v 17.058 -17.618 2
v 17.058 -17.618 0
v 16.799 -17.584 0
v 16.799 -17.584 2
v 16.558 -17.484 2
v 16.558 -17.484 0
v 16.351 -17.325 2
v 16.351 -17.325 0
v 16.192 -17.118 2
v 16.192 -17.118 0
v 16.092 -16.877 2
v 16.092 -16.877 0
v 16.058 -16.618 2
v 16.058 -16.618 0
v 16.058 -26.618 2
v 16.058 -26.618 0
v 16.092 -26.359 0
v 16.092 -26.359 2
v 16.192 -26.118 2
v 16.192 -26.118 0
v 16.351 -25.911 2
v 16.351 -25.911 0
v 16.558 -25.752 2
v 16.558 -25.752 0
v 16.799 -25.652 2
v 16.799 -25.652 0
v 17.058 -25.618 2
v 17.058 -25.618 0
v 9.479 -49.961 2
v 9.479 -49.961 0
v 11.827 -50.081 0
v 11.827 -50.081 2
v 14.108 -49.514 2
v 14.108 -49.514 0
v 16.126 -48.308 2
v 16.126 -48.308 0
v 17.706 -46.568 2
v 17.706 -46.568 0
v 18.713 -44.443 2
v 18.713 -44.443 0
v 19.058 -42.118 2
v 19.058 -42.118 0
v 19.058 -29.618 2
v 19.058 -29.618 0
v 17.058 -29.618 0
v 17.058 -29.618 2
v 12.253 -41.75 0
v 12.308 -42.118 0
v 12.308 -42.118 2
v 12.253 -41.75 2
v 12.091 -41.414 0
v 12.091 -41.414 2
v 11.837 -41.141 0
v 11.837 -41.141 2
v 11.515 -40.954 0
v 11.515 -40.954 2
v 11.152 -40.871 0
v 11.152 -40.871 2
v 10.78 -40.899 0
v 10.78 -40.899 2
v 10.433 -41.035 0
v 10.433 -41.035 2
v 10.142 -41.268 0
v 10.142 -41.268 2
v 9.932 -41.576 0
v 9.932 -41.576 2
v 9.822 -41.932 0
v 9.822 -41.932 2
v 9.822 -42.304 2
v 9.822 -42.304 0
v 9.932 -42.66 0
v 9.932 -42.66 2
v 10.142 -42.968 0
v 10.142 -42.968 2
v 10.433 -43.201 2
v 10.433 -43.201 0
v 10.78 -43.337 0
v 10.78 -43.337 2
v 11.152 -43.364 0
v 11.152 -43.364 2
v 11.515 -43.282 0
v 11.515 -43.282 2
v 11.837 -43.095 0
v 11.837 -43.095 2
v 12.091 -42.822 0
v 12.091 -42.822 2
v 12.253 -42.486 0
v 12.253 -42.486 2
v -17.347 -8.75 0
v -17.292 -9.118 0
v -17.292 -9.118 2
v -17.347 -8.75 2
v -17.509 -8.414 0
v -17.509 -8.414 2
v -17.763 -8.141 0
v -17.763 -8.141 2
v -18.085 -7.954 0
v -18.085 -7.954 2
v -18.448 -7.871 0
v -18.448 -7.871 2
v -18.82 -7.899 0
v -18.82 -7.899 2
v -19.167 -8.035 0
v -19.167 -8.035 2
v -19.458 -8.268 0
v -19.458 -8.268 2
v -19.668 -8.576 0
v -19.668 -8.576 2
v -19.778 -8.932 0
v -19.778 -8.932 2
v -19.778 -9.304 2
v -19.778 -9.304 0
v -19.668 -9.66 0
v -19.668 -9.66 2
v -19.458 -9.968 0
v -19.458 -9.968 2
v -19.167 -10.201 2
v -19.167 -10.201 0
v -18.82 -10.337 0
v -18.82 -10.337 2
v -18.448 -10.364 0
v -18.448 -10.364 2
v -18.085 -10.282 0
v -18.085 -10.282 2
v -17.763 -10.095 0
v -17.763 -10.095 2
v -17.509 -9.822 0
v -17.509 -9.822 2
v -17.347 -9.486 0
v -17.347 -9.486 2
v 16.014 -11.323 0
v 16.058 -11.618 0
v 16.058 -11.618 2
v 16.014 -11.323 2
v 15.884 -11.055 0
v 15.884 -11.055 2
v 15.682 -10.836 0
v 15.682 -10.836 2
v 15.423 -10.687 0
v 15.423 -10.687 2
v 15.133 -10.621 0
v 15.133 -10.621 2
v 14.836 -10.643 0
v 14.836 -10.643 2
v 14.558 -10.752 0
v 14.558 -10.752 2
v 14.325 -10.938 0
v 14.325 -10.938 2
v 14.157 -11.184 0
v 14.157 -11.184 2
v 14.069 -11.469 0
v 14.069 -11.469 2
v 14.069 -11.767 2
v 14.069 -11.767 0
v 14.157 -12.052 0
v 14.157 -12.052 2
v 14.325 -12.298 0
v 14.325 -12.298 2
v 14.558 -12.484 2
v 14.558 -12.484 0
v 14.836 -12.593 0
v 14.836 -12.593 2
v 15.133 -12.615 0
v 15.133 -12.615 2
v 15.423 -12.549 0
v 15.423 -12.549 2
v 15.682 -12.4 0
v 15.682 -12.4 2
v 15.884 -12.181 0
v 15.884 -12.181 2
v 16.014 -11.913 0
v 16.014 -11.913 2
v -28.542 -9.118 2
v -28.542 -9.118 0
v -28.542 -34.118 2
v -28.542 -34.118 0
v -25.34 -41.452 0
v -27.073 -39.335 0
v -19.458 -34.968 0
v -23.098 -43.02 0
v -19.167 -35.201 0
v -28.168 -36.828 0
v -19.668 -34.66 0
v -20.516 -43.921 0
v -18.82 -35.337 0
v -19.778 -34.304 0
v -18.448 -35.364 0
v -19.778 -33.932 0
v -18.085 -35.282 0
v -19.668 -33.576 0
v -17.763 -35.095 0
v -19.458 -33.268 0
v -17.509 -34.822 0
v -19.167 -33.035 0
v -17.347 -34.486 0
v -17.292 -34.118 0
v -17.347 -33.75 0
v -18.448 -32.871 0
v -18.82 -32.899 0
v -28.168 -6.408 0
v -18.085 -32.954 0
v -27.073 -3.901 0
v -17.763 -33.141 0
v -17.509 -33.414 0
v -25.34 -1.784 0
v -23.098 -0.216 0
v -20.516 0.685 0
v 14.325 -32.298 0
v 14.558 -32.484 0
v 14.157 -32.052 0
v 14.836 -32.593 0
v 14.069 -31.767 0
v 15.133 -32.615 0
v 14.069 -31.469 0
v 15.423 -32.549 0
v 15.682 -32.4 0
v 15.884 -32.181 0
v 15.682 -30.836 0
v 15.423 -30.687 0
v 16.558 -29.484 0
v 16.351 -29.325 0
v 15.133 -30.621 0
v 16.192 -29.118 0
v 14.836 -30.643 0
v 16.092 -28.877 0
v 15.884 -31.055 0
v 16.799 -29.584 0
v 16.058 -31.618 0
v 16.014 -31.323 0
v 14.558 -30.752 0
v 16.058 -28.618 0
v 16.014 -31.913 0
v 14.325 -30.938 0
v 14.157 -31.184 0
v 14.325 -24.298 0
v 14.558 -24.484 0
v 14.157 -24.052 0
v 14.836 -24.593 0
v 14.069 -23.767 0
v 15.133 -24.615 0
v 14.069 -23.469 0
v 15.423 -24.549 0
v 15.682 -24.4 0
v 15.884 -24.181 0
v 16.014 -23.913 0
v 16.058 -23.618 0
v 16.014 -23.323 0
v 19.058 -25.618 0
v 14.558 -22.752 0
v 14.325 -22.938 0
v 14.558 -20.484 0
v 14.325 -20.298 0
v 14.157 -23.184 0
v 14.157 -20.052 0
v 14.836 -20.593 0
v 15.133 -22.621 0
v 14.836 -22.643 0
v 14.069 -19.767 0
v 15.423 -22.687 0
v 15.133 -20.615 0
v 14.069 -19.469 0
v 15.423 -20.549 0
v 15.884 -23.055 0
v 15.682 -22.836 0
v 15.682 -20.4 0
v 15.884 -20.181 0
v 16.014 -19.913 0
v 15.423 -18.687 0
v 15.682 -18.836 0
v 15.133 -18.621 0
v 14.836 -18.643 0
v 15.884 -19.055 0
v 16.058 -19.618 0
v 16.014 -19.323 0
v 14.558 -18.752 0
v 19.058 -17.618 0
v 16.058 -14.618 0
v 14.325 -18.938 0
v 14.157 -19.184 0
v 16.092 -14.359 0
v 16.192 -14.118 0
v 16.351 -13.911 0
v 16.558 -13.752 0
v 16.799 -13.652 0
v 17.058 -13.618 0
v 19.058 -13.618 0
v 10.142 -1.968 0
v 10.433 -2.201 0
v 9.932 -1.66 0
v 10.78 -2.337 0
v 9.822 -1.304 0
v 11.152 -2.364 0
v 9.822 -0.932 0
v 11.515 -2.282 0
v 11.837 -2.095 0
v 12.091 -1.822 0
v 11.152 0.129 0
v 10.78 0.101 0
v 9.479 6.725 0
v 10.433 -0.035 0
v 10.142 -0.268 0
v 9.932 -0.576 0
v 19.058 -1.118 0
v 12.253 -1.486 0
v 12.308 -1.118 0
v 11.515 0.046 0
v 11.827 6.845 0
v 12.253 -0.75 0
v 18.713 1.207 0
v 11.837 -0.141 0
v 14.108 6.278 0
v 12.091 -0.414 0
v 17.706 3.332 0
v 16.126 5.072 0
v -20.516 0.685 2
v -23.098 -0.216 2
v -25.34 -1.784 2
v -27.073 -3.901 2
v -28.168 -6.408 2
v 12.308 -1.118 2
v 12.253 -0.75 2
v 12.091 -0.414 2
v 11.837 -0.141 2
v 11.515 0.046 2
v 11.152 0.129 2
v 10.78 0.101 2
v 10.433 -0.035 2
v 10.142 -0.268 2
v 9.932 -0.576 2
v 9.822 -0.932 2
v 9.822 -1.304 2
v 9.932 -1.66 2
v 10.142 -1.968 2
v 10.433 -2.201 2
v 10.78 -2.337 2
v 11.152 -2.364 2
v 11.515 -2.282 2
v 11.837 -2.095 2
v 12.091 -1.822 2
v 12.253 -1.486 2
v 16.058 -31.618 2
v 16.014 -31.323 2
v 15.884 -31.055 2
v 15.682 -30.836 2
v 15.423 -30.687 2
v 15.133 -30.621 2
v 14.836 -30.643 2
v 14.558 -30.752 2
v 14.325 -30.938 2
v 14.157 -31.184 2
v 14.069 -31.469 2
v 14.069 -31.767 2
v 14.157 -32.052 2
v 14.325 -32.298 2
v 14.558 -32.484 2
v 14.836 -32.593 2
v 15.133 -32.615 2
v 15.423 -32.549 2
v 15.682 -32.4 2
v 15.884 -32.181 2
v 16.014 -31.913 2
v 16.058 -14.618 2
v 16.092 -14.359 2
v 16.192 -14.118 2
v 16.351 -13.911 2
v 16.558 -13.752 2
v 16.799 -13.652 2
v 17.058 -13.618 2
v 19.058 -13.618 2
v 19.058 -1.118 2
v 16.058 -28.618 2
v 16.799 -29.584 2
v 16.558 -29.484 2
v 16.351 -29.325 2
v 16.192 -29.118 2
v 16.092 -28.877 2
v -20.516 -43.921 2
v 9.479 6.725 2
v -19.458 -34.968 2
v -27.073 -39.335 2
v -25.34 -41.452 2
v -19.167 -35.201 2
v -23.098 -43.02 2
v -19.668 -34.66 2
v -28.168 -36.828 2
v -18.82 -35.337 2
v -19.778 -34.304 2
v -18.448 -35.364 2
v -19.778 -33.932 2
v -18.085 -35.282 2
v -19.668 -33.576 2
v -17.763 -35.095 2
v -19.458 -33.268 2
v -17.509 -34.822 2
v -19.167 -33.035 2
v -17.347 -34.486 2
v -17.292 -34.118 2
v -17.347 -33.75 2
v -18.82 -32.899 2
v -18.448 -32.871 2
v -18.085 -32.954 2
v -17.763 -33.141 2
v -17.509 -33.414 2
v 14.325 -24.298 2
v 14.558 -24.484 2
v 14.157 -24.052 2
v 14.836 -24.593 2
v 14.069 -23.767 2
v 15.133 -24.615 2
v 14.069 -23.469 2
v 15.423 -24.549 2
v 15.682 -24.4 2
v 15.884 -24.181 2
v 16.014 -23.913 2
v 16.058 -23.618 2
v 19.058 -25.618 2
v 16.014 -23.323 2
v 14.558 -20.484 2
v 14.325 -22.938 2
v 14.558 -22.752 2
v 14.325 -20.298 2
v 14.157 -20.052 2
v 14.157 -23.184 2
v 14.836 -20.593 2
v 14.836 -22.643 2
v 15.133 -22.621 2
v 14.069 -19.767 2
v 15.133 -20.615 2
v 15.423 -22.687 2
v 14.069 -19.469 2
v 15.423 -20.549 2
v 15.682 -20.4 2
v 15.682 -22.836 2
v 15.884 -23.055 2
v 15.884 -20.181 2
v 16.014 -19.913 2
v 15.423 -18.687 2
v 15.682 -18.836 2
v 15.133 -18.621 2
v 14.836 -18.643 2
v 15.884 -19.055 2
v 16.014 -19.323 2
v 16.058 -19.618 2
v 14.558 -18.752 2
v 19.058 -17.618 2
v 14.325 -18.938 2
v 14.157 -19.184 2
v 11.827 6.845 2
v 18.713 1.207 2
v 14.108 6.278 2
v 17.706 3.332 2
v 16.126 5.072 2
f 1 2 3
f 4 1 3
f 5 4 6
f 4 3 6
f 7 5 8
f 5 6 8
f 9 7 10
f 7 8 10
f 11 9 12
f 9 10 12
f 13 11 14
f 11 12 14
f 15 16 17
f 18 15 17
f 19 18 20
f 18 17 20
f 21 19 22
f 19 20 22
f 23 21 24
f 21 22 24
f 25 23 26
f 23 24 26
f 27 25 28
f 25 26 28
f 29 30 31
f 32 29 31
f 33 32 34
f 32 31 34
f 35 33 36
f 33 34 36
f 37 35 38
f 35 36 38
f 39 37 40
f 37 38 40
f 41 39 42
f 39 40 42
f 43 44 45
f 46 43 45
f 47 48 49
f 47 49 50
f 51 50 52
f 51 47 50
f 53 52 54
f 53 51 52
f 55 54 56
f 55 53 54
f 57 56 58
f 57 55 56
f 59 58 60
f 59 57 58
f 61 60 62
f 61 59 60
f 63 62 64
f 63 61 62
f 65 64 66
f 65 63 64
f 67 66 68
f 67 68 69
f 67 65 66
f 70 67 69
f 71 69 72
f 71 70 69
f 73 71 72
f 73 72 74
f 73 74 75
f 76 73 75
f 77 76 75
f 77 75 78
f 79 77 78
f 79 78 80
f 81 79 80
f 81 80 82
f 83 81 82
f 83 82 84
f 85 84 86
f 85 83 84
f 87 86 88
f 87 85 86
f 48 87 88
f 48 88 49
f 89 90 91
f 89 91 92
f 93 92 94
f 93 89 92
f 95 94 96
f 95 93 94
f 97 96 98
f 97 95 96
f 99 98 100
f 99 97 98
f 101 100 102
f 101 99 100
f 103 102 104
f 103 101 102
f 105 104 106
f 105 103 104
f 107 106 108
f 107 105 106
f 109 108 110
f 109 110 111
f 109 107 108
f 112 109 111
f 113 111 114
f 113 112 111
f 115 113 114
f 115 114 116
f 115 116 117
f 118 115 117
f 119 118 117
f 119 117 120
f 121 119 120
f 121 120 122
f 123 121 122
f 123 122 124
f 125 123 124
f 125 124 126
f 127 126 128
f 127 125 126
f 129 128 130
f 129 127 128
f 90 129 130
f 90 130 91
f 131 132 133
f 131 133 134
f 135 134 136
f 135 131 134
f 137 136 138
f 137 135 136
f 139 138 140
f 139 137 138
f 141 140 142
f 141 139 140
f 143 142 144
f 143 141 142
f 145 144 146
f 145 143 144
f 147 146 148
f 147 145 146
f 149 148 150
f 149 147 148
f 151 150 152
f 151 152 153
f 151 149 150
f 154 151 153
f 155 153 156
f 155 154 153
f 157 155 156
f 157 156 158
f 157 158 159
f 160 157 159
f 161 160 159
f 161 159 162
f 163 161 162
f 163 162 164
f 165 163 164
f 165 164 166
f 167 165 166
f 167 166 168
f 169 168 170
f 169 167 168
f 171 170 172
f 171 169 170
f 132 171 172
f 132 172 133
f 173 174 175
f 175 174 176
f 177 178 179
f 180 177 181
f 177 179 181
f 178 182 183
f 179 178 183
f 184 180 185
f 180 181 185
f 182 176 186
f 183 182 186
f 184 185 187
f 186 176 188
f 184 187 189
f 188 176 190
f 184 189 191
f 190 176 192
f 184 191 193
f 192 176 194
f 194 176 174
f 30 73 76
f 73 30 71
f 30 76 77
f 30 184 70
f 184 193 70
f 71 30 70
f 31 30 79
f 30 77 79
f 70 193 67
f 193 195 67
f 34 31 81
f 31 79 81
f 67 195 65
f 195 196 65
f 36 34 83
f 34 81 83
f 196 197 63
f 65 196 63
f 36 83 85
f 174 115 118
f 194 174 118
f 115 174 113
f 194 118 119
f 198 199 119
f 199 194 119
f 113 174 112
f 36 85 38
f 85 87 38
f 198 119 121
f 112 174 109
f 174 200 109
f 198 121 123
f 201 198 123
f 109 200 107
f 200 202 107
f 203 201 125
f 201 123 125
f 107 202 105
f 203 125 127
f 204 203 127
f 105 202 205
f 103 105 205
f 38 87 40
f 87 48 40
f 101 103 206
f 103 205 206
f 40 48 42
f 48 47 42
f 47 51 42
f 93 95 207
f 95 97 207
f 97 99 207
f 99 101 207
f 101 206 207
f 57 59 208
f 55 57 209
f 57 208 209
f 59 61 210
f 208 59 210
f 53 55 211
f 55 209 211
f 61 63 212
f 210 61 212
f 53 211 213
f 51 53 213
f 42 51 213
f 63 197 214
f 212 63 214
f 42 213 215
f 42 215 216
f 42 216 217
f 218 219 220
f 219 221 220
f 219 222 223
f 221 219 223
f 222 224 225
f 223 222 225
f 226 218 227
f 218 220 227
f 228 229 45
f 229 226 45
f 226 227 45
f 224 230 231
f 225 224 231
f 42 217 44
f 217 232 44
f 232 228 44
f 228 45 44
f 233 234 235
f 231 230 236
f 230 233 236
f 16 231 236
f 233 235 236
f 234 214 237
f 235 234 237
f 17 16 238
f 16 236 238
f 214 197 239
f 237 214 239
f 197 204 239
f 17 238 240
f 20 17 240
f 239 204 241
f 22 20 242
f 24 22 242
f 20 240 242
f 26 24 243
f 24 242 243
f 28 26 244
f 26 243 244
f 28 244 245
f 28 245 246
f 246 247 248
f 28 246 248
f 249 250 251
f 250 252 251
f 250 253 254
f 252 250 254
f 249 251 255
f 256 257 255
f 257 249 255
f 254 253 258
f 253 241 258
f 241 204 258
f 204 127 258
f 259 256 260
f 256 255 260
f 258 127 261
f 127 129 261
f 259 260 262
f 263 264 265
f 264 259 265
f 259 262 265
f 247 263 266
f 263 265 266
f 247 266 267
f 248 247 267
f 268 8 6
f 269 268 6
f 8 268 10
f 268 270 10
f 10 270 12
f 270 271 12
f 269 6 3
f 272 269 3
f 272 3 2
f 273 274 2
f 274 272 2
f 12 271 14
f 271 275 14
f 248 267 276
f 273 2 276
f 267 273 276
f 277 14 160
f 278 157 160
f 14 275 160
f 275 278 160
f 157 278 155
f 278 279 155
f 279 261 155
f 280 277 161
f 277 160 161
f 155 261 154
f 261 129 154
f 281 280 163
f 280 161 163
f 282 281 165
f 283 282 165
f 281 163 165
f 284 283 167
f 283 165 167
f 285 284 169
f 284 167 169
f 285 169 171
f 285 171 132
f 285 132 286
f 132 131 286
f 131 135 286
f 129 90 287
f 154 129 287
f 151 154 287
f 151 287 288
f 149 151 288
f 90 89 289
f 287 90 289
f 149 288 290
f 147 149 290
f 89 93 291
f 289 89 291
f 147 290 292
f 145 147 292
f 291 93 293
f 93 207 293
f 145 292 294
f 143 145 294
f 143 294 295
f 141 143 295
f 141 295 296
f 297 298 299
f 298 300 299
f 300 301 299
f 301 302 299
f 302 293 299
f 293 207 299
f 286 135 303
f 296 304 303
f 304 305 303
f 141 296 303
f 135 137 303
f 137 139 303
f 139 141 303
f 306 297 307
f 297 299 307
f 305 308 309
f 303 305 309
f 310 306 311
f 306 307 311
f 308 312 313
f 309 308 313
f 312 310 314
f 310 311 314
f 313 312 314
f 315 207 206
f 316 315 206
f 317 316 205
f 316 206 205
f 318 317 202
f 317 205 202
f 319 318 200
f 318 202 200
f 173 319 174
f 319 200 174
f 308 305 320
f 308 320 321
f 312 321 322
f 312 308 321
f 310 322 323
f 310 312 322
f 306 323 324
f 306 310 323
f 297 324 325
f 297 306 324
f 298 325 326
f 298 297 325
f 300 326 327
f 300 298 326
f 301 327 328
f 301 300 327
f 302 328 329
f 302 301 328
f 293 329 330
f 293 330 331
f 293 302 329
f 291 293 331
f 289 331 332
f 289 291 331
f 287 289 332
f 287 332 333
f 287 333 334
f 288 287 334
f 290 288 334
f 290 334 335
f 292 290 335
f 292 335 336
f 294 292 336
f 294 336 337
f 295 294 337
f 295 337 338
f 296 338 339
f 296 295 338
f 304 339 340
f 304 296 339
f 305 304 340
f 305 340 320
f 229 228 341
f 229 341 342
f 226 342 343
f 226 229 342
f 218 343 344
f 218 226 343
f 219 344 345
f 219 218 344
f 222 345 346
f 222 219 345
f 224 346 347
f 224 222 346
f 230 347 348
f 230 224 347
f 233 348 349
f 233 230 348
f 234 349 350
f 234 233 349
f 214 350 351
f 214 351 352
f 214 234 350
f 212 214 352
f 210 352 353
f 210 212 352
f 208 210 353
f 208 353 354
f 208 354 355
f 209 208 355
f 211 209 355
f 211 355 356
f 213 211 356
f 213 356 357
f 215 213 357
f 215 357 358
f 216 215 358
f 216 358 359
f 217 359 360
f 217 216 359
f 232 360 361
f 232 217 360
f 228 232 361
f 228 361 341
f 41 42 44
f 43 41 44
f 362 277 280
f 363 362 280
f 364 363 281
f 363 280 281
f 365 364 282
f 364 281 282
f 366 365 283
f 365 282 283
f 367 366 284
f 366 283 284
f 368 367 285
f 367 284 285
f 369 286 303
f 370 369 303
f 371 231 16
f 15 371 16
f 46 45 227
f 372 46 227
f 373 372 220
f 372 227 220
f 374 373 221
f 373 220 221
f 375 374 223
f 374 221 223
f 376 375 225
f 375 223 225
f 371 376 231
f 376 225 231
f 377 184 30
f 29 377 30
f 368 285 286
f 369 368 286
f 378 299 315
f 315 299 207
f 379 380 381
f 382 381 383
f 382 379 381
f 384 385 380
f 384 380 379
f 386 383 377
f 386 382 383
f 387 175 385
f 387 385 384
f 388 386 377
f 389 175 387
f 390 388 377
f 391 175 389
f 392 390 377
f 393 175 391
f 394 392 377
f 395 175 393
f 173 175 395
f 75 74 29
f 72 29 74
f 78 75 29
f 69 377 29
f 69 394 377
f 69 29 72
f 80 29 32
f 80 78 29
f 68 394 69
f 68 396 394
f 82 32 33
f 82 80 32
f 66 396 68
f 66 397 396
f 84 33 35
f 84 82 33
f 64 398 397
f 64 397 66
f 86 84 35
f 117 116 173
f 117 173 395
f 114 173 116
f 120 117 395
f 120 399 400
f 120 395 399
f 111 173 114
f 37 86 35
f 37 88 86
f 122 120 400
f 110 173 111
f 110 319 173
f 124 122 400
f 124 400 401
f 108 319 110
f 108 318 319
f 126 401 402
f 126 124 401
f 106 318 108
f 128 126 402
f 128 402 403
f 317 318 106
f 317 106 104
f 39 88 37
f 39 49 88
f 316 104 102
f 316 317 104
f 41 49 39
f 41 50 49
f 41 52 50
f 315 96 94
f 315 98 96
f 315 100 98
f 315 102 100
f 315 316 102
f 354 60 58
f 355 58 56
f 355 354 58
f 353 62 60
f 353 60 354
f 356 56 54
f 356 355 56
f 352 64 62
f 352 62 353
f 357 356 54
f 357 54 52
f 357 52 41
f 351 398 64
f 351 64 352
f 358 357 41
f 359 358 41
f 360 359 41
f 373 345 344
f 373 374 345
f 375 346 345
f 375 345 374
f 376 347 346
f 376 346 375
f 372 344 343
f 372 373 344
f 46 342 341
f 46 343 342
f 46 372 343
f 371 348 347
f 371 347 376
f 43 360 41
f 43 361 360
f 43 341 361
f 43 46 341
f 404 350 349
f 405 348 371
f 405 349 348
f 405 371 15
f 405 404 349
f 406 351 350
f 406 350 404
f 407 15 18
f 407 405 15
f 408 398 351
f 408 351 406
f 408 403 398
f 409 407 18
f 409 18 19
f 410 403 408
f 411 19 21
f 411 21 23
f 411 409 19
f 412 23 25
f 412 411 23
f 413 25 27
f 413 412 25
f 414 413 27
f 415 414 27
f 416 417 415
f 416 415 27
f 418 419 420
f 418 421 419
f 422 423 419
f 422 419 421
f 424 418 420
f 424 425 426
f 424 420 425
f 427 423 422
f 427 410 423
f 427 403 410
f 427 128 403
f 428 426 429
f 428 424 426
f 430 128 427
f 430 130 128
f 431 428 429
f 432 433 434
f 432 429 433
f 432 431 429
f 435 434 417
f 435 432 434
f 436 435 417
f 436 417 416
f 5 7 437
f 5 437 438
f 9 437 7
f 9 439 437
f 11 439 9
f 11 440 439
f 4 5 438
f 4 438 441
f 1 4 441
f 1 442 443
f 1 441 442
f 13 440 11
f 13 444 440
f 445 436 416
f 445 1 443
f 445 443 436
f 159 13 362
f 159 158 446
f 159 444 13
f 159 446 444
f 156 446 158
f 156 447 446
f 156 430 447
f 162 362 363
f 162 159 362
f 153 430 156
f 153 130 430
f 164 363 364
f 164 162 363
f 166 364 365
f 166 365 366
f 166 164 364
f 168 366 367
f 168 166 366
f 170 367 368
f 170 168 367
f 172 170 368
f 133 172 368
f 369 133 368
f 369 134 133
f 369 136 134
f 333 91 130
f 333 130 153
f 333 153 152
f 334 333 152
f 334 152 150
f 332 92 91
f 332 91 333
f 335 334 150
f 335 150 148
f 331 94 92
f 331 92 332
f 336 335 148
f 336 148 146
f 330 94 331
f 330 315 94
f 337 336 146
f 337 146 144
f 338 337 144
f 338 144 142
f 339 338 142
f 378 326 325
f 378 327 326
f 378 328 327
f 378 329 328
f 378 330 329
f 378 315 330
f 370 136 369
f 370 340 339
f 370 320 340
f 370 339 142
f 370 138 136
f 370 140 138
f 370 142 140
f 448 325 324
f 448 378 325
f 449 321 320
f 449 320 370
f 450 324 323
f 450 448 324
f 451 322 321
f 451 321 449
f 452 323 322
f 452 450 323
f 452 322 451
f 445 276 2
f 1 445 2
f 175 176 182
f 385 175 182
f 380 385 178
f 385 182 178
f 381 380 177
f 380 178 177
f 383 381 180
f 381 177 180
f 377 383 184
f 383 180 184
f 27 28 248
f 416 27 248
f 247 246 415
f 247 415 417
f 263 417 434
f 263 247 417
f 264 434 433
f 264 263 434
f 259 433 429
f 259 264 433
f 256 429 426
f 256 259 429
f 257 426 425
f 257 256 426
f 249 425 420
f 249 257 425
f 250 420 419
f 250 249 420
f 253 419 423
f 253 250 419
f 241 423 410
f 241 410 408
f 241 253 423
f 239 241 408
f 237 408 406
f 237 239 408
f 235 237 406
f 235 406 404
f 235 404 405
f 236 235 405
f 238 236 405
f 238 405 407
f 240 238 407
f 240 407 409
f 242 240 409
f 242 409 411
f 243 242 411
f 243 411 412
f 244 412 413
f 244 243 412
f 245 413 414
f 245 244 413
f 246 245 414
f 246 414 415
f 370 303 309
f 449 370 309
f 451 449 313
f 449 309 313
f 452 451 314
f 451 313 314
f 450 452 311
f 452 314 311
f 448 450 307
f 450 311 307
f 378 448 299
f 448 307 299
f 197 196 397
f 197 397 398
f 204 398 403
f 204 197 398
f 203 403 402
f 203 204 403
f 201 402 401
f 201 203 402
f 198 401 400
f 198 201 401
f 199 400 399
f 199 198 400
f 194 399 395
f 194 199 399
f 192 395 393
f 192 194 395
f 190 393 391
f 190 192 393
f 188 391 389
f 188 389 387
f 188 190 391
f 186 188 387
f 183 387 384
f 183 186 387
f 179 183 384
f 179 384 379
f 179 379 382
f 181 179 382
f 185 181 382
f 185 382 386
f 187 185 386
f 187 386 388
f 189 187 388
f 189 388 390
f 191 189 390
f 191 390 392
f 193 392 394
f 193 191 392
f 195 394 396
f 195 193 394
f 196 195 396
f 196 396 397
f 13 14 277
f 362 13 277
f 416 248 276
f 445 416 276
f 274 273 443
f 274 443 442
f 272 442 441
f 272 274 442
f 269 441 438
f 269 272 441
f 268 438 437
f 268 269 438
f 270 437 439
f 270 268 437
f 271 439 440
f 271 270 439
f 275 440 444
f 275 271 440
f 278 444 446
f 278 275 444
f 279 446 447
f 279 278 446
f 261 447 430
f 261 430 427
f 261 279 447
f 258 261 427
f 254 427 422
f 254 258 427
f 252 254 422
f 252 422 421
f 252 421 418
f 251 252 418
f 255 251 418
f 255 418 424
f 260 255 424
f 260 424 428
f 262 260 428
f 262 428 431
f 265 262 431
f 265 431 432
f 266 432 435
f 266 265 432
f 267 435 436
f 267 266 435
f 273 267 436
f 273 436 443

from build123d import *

# Parameters (mm, degrees)
SKETCH_1_R      = 1.25
SKETCH_1_R_2    = 1
EXTRUDE_2_DEPTH = 2


with BuildPart() as part:
    # 草圖1 → 填料-伸長2 (new body)
    with BuildSketch(Plane.XY):
        with BuildLine():
            Line((-28.541905067, -9.1179941), (-28.541905067, -34.1179941))
            ThreePointArc((-28.541905067, -34.1179941), (-26.279428563, -40.452876116), (-20.515759037, -43.921253788))
            Line((-20.515759037, -43.921253788), (9.479011757, -49.960601851))
            ThreePointArc((9.479011757, -49.960601851), (16.126000545, -48.308012897), (19.058094933, -42.1179941))
            Line((19.058094933, -42.1179941), (19.058094933, -29.6179941))
            Line((19.058094933, -29.6179941), (17.058094933, -29.6179941))
            ThreePointArc((17.058094933, -29.6179941), (16.350988152, -29.325100881), (16.058094933, -28.6179941))
            Line((16.058094933, -28.6179941), (16.058094933, -26.6179941))
            ThreePointArc((16.058094933, -26.6179941), (16.350988152, -25.910887319), (17.058094933, -25.6179941))
            Line((17.058094933, -25.6179941), (19.058094933, -25.6179941))
            Line((19.058094933, -25.6179941), (19.058094933, -17.6179941))
            Line((19.058094933, -17.6179941), (17.058094933, -17.6179941))
            ThreePointArc((17.058094933, -17.6179941), (16.350988152, -17.325100881), (16.058094933, -16.6179941))
            Line((16.058094933, -16.6179941), (16.058094933, -14.6179941))
            ThreePointArc((16.058094933, -14.6179941), (16.350988152, -13.910887319), (17.058094933, -13.6179941))
            Line((17.058094933, -13.6179941), (19.058094933, -13.6179941))
            Line((19.058094933, -13.6179941), (19.058094933, -1.1179941))
            ThreePointArc((19.058094933, -1.1179941), (16.126000545, 5.072024696), (9.479011757, 6.72461365))
            Line((9.479011757, 6.72461365), (-20.515759037, 0.685265588))
            ThreePointArc((-20.515759037, 0.685265588), (-26.279428563, -2.783112085), (-28.541905067, -9.1179941))
        make_face()
        with Locations((-18.541905067, -9.1179941)):
            Circle(SKETCH_1_R, mode=Mode.SUBTRACT)
        with Locations((15.058094933, -11.6179941)):
            Circle(SKETCH_1_R_2, mode=Mode.SUBTRACT)
        with Locations((15.058094933, -19.6179941)):
            Circle(SKETCH_1_R_2, mode=Mode.SUBTRACT)
        with Locations((15.058094933, -23.6179941)):
            Circle(SKETCH_1_R_2, mode=Mode.SUBTRACT)
        with Locations((-18.541905067, -34.1179941)):
            Circle(SKETCH_1_R, mode=Mode.SUBTRACT)
        with Locations((11.058094933, -1.1179941)):
            Circle(SKETCH_1_R, mode=Mode.SUBTRACT)
        with Locations((15.058094933, -31.6179941)):
            Circle(SKETCH_1_R_2, mode=Mode.SUBTRACT)
        with Locations((11.058094933, -42.1179941)):
            Circle(SKETCH_1_R, mode=Mode.SUBTRACT)
    extrude(amount=EXTRUDE_2_DEPTH)


solid = part.part
